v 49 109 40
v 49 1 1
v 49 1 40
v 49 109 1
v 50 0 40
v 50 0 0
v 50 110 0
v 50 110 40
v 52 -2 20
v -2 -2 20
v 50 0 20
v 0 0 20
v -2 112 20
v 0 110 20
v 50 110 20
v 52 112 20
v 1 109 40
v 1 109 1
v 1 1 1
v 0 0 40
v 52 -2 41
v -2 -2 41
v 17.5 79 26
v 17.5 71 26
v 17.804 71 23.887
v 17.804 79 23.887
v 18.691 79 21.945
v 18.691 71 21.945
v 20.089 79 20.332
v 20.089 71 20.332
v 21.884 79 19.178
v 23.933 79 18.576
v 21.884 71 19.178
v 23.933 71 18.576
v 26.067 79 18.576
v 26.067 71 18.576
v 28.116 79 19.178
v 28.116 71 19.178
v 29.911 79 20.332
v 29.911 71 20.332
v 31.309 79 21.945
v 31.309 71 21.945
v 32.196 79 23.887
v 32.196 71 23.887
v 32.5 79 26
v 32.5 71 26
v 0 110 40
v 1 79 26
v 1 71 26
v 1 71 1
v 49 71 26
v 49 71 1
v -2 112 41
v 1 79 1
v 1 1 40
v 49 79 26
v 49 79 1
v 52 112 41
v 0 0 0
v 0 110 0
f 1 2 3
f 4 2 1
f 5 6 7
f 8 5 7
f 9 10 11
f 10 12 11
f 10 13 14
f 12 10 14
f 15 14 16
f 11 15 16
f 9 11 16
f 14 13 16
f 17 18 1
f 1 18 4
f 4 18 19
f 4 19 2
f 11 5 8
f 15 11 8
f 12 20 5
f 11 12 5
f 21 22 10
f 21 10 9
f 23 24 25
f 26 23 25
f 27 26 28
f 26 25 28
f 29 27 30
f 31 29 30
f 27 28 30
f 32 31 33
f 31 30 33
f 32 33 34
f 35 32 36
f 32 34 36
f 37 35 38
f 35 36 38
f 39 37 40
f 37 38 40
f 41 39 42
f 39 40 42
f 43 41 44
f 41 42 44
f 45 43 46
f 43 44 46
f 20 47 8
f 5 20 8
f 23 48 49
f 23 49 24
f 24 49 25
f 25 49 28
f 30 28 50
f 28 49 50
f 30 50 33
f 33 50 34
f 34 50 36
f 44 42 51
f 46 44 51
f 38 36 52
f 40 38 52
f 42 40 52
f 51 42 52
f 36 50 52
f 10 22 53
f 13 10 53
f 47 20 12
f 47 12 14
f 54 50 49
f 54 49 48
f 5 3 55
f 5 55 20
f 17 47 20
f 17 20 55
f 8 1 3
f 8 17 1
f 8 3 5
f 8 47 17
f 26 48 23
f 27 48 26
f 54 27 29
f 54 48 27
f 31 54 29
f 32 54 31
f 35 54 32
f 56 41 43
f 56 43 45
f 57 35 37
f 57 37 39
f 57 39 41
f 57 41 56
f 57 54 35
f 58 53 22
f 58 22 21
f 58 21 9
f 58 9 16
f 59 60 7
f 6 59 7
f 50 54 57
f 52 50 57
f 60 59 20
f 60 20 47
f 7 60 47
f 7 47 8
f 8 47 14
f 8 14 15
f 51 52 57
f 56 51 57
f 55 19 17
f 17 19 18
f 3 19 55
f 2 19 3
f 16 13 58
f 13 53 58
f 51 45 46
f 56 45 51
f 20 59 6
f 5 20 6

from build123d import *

# Parameters (mm, degrees)
F0_W     = 50
F0_H     = 110
F1_DEPTH = 40
F2_T     = -1
F3_W     = 54
F3_H     = 114
F3_W_2   = 50
F3_H_2   = 110
F3_W_3   = 48
F3_H_3   = 108
F4_DEPTH = 1
F5_DEPTH = 20
F6_W     = 48
F6_H     = 8
F7_DEPTH = 25
F9_DEPTH = 41.001


with BuildPart() as f1:
    # F0 (on Top) → F1 (new body)
    with BuildSketch(Plane.XY):
        with Locations((25, 55)):
            Rectangle(F0_W, F0_H)
    extrude(amount=F1_DEPTH)

    # F2
    f2_openings = [f1.faces().sort_by_distance(p)[0] for p in [
        (25, 55, 40),
    ]]
    offset(amount=F2_T, openings=f2_openings)


with BuildPart() as f4:
    # F3 (on face) → F4 (new body)
    with BuildSketch(Plane.XY.offset(40)):
        with Locations((25, 55)):
            Rectangle(F3_W, F3_H)
        with Locations((25, 55)):
            Rectangle(F3_W_2, F3_H_2, mode=Mode.SUBTRACT)
        with Locations((25, 55)):
            Rectangle(F3_W_2, F3_H_2)
        with Locations((25, 55)):
            Rectangle(F3_W_3, F3_H_3, mode=Mode.SUBTRACT)
        with Locations((25, 55)):
            Rectangle(F3_W_3, F3_H_3)
    extrude(amount=F4_DEPTH)

    # F3 (on face) → F5 (join)
    with BuildSketch(Plane.XY.offset(40)):
        with Locations((25, 55)):
            Rectangle(F3_W, F3_H)
        with Locations((25, 55)):
            Rectangle(F3_W_2, F3_H_2, mode=Mode.SUBTRACT)
    extrude(amount=-F5_DEPTH)


with BuildPart() as f7:
    # F6 (on face) → F7 (new body)
    with BuildSketch(Plane.XY.offset(1)):
        with Locations((25, 75)):
            Rectangle(F6_W, F6_H)
    extrude(amount=F7_DEPTH)

    # F8 (on face) → F9 (cut, through all)
    with BuildSketch(Plane.XZ.offset(-71)):
        with BuildLine():
            ThreePointArc((17.5, 26), (25, 18.5), (32.5, 26))
            Line((32.5, 26), (17.5, 26))
        make_face()
    extrude(amount=-F9_DEPTH, mode=Mode.SUBTRACT)


solid = Compound([f1.part, f4.part, f7.part])
